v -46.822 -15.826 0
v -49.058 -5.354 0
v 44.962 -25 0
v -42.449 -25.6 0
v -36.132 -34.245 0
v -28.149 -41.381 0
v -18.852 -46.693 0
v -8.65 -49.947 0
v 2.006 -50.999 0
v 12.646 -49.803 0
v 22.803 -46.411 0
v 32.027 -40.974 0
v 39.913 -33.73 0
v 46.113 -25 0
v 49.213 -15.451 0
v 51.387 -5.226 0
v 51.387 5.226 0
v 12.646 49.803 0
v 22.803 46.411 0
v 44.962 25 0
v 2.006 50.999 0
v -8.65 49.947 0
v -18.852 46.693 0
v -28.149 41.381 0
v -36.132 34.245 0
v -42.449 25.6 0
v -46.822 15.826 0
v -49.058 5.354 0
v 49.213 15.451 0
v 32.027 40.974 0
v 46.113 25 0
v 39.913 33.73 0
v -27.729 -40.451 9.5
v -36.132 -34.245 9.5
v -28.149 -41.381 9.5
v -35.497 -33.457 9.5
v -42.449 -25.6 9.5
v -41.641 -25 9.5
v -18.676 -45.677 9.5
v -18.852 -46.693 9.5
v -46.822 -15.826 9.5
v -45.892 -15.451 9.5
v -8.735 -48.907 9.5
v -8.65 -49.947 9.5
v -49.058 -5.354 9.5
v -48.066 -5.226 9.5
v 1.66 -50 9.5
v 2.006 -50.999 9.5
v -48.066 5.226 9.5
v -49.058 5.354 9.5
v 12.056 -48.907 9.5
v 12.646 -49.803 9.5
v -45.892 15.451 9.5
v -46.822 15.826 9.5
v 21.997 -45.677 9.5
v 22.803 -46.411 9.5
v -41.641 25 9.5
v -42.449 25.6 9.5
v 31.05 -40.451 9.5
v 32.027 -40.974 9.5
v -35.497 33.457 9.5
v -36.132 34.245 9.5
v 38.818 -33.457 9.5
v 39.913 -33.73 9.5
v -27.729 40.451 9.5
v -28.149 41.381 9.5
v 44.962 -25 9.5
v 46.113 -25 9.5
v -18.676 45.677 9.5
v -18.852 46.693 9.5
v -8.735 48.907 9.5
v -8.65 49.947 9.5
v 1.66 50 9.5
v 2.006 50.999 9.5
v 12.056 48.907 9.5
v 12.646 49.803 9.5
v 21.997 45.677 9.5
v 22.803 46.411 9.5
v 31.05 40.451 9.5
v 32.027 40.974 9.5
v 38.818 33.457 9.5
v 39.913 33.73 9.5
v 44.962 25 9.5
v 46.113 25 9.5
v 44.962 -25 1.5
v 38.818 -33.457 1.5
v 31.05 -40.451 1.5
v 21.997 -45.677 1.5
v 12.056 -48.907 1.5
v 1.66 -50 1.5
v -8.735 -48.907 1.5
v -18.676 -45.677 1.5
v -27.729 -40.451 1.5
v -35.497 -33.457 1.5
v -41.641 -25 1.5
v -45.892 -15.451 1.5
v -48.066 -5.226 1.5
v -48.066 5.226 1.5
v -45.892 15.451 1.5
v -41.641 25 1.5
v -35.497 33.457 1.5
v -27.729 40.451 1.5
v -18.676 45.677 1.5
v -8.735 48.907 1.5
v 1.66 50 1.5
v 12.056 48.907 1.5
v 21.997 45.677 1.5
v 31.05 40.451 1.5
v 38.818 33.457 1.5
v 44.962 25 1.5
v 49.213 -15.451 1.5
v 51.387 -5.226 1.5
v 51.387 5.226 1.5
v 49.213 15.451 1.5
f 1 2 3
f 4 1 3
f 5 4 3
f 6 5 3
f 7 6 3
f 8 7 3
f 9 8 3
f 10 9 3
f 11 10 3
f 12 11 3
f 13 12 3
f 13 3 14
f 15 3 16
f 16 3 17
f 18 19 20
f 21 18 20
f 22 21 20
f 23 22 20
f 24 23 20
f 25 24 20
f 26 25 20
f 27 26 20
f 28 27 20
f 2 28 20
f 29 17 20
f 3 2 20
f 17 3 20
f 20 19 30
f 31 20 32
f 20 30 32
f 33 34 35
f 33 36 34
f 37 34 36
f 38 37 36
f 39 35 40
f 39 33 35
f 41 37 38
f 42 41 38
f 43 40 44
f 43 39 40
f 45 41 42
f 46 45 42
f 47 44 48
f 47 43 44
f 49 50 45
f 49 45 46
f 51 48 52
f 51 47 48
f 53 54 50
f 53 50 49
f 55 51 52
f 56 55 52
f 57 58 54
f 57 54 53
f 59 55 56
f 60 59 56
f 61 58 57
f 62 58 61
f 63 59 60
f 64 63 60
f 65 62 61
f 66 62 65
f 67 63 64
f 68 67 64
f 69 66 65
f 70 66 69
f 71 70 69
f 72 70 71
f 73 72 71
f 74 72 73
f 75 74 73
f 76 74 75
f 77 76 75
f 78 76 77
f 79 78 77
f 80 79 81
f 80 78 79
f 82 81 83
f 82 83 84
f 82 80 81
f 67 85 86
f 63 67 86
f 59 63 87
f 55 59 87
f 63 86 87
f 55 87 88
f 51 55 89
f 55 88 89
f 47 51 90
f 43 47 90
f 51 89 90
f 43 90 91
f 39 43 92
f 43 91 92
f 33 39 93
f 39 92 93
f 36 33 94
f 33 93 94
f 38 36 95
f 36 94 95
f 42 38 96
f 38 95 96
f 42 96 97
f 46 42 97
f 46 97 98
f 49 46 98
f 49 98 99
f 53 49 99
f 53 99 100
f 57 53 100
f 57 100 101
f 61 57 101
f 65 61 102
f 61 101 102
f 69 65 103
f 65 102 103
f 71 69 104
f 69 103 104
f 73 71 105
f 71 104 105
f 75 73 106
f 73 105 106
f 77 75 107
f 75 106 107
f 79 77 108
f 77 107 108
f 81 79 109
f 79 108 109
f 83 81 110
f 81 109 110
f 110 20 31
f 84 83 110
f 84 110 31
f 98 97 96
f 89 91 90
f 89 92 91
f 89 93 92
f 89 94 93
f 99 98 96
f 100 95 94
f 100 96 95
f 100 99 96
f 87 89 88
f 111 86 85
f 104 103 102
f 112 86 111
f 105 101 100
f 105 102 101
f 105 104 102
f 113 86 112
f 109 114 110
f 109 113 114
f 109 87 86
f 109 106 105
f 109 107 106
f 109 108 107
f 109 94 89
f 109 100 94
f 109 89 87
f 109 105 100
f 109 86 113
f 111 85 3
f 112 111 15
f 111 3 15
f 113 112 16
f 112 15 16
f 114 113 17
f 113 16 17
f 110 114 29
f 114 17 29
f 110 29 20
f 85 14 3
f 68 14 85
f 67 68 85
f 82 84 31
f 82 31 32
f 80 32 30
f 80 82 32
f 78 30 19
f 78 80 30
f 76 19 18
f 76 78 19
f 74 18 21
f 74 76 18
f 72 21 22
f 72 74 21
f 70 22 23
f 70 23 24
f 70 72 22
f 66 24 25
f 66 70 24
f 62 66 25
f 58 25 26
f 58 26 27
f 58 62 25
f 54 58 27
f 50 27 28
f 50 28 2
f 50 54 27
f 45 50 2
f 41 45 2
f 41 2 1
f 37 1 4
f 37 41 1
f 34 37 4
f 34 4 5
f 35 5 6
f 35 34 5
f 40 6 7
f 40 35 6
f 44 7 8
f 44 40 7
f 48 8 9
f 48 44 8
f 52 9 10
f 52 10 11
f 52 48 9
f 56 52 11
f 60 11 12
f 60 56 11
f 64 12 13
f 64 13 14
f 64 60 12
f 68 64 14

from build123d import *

# Parameters (mm, degrees)
F0_R          = 50
F1_DEPTH      = 1.5
F3_DEPTH      = 8
F3_DEPTH_BACK = 1.5


with BuildPart() as f1:
    # F0 (on Top) → F1 (new body)
    with BuildSketch(Plane.XY):
        with Locations((1.66043, 0)):
            Circle(F0_R)
    extrude(amount=F1_DEPTH)

    # F2 (on face) → F3 (join, two sides)
    with BuildSketch(Plane.XY.offset(1.5)) as f3_sk:
        with BuildLine():
            ThreePointArc((44.9617, -25), (-48.33957, 0), (44.9617, 25))
            Line((44.9617, 25), (46.112651, 25))
            ThreePointArc((46.112651, 25), (-49.33957, 0), (46.112651, -25))
            Line((46.112651, -25), (44.9617, -25))
        make_face()
    extrude(amount=F3_DEPTH)
    extrude(f3_sk.sketch, amount=-F3_DEPTH_BACK)


solid = f1.part
